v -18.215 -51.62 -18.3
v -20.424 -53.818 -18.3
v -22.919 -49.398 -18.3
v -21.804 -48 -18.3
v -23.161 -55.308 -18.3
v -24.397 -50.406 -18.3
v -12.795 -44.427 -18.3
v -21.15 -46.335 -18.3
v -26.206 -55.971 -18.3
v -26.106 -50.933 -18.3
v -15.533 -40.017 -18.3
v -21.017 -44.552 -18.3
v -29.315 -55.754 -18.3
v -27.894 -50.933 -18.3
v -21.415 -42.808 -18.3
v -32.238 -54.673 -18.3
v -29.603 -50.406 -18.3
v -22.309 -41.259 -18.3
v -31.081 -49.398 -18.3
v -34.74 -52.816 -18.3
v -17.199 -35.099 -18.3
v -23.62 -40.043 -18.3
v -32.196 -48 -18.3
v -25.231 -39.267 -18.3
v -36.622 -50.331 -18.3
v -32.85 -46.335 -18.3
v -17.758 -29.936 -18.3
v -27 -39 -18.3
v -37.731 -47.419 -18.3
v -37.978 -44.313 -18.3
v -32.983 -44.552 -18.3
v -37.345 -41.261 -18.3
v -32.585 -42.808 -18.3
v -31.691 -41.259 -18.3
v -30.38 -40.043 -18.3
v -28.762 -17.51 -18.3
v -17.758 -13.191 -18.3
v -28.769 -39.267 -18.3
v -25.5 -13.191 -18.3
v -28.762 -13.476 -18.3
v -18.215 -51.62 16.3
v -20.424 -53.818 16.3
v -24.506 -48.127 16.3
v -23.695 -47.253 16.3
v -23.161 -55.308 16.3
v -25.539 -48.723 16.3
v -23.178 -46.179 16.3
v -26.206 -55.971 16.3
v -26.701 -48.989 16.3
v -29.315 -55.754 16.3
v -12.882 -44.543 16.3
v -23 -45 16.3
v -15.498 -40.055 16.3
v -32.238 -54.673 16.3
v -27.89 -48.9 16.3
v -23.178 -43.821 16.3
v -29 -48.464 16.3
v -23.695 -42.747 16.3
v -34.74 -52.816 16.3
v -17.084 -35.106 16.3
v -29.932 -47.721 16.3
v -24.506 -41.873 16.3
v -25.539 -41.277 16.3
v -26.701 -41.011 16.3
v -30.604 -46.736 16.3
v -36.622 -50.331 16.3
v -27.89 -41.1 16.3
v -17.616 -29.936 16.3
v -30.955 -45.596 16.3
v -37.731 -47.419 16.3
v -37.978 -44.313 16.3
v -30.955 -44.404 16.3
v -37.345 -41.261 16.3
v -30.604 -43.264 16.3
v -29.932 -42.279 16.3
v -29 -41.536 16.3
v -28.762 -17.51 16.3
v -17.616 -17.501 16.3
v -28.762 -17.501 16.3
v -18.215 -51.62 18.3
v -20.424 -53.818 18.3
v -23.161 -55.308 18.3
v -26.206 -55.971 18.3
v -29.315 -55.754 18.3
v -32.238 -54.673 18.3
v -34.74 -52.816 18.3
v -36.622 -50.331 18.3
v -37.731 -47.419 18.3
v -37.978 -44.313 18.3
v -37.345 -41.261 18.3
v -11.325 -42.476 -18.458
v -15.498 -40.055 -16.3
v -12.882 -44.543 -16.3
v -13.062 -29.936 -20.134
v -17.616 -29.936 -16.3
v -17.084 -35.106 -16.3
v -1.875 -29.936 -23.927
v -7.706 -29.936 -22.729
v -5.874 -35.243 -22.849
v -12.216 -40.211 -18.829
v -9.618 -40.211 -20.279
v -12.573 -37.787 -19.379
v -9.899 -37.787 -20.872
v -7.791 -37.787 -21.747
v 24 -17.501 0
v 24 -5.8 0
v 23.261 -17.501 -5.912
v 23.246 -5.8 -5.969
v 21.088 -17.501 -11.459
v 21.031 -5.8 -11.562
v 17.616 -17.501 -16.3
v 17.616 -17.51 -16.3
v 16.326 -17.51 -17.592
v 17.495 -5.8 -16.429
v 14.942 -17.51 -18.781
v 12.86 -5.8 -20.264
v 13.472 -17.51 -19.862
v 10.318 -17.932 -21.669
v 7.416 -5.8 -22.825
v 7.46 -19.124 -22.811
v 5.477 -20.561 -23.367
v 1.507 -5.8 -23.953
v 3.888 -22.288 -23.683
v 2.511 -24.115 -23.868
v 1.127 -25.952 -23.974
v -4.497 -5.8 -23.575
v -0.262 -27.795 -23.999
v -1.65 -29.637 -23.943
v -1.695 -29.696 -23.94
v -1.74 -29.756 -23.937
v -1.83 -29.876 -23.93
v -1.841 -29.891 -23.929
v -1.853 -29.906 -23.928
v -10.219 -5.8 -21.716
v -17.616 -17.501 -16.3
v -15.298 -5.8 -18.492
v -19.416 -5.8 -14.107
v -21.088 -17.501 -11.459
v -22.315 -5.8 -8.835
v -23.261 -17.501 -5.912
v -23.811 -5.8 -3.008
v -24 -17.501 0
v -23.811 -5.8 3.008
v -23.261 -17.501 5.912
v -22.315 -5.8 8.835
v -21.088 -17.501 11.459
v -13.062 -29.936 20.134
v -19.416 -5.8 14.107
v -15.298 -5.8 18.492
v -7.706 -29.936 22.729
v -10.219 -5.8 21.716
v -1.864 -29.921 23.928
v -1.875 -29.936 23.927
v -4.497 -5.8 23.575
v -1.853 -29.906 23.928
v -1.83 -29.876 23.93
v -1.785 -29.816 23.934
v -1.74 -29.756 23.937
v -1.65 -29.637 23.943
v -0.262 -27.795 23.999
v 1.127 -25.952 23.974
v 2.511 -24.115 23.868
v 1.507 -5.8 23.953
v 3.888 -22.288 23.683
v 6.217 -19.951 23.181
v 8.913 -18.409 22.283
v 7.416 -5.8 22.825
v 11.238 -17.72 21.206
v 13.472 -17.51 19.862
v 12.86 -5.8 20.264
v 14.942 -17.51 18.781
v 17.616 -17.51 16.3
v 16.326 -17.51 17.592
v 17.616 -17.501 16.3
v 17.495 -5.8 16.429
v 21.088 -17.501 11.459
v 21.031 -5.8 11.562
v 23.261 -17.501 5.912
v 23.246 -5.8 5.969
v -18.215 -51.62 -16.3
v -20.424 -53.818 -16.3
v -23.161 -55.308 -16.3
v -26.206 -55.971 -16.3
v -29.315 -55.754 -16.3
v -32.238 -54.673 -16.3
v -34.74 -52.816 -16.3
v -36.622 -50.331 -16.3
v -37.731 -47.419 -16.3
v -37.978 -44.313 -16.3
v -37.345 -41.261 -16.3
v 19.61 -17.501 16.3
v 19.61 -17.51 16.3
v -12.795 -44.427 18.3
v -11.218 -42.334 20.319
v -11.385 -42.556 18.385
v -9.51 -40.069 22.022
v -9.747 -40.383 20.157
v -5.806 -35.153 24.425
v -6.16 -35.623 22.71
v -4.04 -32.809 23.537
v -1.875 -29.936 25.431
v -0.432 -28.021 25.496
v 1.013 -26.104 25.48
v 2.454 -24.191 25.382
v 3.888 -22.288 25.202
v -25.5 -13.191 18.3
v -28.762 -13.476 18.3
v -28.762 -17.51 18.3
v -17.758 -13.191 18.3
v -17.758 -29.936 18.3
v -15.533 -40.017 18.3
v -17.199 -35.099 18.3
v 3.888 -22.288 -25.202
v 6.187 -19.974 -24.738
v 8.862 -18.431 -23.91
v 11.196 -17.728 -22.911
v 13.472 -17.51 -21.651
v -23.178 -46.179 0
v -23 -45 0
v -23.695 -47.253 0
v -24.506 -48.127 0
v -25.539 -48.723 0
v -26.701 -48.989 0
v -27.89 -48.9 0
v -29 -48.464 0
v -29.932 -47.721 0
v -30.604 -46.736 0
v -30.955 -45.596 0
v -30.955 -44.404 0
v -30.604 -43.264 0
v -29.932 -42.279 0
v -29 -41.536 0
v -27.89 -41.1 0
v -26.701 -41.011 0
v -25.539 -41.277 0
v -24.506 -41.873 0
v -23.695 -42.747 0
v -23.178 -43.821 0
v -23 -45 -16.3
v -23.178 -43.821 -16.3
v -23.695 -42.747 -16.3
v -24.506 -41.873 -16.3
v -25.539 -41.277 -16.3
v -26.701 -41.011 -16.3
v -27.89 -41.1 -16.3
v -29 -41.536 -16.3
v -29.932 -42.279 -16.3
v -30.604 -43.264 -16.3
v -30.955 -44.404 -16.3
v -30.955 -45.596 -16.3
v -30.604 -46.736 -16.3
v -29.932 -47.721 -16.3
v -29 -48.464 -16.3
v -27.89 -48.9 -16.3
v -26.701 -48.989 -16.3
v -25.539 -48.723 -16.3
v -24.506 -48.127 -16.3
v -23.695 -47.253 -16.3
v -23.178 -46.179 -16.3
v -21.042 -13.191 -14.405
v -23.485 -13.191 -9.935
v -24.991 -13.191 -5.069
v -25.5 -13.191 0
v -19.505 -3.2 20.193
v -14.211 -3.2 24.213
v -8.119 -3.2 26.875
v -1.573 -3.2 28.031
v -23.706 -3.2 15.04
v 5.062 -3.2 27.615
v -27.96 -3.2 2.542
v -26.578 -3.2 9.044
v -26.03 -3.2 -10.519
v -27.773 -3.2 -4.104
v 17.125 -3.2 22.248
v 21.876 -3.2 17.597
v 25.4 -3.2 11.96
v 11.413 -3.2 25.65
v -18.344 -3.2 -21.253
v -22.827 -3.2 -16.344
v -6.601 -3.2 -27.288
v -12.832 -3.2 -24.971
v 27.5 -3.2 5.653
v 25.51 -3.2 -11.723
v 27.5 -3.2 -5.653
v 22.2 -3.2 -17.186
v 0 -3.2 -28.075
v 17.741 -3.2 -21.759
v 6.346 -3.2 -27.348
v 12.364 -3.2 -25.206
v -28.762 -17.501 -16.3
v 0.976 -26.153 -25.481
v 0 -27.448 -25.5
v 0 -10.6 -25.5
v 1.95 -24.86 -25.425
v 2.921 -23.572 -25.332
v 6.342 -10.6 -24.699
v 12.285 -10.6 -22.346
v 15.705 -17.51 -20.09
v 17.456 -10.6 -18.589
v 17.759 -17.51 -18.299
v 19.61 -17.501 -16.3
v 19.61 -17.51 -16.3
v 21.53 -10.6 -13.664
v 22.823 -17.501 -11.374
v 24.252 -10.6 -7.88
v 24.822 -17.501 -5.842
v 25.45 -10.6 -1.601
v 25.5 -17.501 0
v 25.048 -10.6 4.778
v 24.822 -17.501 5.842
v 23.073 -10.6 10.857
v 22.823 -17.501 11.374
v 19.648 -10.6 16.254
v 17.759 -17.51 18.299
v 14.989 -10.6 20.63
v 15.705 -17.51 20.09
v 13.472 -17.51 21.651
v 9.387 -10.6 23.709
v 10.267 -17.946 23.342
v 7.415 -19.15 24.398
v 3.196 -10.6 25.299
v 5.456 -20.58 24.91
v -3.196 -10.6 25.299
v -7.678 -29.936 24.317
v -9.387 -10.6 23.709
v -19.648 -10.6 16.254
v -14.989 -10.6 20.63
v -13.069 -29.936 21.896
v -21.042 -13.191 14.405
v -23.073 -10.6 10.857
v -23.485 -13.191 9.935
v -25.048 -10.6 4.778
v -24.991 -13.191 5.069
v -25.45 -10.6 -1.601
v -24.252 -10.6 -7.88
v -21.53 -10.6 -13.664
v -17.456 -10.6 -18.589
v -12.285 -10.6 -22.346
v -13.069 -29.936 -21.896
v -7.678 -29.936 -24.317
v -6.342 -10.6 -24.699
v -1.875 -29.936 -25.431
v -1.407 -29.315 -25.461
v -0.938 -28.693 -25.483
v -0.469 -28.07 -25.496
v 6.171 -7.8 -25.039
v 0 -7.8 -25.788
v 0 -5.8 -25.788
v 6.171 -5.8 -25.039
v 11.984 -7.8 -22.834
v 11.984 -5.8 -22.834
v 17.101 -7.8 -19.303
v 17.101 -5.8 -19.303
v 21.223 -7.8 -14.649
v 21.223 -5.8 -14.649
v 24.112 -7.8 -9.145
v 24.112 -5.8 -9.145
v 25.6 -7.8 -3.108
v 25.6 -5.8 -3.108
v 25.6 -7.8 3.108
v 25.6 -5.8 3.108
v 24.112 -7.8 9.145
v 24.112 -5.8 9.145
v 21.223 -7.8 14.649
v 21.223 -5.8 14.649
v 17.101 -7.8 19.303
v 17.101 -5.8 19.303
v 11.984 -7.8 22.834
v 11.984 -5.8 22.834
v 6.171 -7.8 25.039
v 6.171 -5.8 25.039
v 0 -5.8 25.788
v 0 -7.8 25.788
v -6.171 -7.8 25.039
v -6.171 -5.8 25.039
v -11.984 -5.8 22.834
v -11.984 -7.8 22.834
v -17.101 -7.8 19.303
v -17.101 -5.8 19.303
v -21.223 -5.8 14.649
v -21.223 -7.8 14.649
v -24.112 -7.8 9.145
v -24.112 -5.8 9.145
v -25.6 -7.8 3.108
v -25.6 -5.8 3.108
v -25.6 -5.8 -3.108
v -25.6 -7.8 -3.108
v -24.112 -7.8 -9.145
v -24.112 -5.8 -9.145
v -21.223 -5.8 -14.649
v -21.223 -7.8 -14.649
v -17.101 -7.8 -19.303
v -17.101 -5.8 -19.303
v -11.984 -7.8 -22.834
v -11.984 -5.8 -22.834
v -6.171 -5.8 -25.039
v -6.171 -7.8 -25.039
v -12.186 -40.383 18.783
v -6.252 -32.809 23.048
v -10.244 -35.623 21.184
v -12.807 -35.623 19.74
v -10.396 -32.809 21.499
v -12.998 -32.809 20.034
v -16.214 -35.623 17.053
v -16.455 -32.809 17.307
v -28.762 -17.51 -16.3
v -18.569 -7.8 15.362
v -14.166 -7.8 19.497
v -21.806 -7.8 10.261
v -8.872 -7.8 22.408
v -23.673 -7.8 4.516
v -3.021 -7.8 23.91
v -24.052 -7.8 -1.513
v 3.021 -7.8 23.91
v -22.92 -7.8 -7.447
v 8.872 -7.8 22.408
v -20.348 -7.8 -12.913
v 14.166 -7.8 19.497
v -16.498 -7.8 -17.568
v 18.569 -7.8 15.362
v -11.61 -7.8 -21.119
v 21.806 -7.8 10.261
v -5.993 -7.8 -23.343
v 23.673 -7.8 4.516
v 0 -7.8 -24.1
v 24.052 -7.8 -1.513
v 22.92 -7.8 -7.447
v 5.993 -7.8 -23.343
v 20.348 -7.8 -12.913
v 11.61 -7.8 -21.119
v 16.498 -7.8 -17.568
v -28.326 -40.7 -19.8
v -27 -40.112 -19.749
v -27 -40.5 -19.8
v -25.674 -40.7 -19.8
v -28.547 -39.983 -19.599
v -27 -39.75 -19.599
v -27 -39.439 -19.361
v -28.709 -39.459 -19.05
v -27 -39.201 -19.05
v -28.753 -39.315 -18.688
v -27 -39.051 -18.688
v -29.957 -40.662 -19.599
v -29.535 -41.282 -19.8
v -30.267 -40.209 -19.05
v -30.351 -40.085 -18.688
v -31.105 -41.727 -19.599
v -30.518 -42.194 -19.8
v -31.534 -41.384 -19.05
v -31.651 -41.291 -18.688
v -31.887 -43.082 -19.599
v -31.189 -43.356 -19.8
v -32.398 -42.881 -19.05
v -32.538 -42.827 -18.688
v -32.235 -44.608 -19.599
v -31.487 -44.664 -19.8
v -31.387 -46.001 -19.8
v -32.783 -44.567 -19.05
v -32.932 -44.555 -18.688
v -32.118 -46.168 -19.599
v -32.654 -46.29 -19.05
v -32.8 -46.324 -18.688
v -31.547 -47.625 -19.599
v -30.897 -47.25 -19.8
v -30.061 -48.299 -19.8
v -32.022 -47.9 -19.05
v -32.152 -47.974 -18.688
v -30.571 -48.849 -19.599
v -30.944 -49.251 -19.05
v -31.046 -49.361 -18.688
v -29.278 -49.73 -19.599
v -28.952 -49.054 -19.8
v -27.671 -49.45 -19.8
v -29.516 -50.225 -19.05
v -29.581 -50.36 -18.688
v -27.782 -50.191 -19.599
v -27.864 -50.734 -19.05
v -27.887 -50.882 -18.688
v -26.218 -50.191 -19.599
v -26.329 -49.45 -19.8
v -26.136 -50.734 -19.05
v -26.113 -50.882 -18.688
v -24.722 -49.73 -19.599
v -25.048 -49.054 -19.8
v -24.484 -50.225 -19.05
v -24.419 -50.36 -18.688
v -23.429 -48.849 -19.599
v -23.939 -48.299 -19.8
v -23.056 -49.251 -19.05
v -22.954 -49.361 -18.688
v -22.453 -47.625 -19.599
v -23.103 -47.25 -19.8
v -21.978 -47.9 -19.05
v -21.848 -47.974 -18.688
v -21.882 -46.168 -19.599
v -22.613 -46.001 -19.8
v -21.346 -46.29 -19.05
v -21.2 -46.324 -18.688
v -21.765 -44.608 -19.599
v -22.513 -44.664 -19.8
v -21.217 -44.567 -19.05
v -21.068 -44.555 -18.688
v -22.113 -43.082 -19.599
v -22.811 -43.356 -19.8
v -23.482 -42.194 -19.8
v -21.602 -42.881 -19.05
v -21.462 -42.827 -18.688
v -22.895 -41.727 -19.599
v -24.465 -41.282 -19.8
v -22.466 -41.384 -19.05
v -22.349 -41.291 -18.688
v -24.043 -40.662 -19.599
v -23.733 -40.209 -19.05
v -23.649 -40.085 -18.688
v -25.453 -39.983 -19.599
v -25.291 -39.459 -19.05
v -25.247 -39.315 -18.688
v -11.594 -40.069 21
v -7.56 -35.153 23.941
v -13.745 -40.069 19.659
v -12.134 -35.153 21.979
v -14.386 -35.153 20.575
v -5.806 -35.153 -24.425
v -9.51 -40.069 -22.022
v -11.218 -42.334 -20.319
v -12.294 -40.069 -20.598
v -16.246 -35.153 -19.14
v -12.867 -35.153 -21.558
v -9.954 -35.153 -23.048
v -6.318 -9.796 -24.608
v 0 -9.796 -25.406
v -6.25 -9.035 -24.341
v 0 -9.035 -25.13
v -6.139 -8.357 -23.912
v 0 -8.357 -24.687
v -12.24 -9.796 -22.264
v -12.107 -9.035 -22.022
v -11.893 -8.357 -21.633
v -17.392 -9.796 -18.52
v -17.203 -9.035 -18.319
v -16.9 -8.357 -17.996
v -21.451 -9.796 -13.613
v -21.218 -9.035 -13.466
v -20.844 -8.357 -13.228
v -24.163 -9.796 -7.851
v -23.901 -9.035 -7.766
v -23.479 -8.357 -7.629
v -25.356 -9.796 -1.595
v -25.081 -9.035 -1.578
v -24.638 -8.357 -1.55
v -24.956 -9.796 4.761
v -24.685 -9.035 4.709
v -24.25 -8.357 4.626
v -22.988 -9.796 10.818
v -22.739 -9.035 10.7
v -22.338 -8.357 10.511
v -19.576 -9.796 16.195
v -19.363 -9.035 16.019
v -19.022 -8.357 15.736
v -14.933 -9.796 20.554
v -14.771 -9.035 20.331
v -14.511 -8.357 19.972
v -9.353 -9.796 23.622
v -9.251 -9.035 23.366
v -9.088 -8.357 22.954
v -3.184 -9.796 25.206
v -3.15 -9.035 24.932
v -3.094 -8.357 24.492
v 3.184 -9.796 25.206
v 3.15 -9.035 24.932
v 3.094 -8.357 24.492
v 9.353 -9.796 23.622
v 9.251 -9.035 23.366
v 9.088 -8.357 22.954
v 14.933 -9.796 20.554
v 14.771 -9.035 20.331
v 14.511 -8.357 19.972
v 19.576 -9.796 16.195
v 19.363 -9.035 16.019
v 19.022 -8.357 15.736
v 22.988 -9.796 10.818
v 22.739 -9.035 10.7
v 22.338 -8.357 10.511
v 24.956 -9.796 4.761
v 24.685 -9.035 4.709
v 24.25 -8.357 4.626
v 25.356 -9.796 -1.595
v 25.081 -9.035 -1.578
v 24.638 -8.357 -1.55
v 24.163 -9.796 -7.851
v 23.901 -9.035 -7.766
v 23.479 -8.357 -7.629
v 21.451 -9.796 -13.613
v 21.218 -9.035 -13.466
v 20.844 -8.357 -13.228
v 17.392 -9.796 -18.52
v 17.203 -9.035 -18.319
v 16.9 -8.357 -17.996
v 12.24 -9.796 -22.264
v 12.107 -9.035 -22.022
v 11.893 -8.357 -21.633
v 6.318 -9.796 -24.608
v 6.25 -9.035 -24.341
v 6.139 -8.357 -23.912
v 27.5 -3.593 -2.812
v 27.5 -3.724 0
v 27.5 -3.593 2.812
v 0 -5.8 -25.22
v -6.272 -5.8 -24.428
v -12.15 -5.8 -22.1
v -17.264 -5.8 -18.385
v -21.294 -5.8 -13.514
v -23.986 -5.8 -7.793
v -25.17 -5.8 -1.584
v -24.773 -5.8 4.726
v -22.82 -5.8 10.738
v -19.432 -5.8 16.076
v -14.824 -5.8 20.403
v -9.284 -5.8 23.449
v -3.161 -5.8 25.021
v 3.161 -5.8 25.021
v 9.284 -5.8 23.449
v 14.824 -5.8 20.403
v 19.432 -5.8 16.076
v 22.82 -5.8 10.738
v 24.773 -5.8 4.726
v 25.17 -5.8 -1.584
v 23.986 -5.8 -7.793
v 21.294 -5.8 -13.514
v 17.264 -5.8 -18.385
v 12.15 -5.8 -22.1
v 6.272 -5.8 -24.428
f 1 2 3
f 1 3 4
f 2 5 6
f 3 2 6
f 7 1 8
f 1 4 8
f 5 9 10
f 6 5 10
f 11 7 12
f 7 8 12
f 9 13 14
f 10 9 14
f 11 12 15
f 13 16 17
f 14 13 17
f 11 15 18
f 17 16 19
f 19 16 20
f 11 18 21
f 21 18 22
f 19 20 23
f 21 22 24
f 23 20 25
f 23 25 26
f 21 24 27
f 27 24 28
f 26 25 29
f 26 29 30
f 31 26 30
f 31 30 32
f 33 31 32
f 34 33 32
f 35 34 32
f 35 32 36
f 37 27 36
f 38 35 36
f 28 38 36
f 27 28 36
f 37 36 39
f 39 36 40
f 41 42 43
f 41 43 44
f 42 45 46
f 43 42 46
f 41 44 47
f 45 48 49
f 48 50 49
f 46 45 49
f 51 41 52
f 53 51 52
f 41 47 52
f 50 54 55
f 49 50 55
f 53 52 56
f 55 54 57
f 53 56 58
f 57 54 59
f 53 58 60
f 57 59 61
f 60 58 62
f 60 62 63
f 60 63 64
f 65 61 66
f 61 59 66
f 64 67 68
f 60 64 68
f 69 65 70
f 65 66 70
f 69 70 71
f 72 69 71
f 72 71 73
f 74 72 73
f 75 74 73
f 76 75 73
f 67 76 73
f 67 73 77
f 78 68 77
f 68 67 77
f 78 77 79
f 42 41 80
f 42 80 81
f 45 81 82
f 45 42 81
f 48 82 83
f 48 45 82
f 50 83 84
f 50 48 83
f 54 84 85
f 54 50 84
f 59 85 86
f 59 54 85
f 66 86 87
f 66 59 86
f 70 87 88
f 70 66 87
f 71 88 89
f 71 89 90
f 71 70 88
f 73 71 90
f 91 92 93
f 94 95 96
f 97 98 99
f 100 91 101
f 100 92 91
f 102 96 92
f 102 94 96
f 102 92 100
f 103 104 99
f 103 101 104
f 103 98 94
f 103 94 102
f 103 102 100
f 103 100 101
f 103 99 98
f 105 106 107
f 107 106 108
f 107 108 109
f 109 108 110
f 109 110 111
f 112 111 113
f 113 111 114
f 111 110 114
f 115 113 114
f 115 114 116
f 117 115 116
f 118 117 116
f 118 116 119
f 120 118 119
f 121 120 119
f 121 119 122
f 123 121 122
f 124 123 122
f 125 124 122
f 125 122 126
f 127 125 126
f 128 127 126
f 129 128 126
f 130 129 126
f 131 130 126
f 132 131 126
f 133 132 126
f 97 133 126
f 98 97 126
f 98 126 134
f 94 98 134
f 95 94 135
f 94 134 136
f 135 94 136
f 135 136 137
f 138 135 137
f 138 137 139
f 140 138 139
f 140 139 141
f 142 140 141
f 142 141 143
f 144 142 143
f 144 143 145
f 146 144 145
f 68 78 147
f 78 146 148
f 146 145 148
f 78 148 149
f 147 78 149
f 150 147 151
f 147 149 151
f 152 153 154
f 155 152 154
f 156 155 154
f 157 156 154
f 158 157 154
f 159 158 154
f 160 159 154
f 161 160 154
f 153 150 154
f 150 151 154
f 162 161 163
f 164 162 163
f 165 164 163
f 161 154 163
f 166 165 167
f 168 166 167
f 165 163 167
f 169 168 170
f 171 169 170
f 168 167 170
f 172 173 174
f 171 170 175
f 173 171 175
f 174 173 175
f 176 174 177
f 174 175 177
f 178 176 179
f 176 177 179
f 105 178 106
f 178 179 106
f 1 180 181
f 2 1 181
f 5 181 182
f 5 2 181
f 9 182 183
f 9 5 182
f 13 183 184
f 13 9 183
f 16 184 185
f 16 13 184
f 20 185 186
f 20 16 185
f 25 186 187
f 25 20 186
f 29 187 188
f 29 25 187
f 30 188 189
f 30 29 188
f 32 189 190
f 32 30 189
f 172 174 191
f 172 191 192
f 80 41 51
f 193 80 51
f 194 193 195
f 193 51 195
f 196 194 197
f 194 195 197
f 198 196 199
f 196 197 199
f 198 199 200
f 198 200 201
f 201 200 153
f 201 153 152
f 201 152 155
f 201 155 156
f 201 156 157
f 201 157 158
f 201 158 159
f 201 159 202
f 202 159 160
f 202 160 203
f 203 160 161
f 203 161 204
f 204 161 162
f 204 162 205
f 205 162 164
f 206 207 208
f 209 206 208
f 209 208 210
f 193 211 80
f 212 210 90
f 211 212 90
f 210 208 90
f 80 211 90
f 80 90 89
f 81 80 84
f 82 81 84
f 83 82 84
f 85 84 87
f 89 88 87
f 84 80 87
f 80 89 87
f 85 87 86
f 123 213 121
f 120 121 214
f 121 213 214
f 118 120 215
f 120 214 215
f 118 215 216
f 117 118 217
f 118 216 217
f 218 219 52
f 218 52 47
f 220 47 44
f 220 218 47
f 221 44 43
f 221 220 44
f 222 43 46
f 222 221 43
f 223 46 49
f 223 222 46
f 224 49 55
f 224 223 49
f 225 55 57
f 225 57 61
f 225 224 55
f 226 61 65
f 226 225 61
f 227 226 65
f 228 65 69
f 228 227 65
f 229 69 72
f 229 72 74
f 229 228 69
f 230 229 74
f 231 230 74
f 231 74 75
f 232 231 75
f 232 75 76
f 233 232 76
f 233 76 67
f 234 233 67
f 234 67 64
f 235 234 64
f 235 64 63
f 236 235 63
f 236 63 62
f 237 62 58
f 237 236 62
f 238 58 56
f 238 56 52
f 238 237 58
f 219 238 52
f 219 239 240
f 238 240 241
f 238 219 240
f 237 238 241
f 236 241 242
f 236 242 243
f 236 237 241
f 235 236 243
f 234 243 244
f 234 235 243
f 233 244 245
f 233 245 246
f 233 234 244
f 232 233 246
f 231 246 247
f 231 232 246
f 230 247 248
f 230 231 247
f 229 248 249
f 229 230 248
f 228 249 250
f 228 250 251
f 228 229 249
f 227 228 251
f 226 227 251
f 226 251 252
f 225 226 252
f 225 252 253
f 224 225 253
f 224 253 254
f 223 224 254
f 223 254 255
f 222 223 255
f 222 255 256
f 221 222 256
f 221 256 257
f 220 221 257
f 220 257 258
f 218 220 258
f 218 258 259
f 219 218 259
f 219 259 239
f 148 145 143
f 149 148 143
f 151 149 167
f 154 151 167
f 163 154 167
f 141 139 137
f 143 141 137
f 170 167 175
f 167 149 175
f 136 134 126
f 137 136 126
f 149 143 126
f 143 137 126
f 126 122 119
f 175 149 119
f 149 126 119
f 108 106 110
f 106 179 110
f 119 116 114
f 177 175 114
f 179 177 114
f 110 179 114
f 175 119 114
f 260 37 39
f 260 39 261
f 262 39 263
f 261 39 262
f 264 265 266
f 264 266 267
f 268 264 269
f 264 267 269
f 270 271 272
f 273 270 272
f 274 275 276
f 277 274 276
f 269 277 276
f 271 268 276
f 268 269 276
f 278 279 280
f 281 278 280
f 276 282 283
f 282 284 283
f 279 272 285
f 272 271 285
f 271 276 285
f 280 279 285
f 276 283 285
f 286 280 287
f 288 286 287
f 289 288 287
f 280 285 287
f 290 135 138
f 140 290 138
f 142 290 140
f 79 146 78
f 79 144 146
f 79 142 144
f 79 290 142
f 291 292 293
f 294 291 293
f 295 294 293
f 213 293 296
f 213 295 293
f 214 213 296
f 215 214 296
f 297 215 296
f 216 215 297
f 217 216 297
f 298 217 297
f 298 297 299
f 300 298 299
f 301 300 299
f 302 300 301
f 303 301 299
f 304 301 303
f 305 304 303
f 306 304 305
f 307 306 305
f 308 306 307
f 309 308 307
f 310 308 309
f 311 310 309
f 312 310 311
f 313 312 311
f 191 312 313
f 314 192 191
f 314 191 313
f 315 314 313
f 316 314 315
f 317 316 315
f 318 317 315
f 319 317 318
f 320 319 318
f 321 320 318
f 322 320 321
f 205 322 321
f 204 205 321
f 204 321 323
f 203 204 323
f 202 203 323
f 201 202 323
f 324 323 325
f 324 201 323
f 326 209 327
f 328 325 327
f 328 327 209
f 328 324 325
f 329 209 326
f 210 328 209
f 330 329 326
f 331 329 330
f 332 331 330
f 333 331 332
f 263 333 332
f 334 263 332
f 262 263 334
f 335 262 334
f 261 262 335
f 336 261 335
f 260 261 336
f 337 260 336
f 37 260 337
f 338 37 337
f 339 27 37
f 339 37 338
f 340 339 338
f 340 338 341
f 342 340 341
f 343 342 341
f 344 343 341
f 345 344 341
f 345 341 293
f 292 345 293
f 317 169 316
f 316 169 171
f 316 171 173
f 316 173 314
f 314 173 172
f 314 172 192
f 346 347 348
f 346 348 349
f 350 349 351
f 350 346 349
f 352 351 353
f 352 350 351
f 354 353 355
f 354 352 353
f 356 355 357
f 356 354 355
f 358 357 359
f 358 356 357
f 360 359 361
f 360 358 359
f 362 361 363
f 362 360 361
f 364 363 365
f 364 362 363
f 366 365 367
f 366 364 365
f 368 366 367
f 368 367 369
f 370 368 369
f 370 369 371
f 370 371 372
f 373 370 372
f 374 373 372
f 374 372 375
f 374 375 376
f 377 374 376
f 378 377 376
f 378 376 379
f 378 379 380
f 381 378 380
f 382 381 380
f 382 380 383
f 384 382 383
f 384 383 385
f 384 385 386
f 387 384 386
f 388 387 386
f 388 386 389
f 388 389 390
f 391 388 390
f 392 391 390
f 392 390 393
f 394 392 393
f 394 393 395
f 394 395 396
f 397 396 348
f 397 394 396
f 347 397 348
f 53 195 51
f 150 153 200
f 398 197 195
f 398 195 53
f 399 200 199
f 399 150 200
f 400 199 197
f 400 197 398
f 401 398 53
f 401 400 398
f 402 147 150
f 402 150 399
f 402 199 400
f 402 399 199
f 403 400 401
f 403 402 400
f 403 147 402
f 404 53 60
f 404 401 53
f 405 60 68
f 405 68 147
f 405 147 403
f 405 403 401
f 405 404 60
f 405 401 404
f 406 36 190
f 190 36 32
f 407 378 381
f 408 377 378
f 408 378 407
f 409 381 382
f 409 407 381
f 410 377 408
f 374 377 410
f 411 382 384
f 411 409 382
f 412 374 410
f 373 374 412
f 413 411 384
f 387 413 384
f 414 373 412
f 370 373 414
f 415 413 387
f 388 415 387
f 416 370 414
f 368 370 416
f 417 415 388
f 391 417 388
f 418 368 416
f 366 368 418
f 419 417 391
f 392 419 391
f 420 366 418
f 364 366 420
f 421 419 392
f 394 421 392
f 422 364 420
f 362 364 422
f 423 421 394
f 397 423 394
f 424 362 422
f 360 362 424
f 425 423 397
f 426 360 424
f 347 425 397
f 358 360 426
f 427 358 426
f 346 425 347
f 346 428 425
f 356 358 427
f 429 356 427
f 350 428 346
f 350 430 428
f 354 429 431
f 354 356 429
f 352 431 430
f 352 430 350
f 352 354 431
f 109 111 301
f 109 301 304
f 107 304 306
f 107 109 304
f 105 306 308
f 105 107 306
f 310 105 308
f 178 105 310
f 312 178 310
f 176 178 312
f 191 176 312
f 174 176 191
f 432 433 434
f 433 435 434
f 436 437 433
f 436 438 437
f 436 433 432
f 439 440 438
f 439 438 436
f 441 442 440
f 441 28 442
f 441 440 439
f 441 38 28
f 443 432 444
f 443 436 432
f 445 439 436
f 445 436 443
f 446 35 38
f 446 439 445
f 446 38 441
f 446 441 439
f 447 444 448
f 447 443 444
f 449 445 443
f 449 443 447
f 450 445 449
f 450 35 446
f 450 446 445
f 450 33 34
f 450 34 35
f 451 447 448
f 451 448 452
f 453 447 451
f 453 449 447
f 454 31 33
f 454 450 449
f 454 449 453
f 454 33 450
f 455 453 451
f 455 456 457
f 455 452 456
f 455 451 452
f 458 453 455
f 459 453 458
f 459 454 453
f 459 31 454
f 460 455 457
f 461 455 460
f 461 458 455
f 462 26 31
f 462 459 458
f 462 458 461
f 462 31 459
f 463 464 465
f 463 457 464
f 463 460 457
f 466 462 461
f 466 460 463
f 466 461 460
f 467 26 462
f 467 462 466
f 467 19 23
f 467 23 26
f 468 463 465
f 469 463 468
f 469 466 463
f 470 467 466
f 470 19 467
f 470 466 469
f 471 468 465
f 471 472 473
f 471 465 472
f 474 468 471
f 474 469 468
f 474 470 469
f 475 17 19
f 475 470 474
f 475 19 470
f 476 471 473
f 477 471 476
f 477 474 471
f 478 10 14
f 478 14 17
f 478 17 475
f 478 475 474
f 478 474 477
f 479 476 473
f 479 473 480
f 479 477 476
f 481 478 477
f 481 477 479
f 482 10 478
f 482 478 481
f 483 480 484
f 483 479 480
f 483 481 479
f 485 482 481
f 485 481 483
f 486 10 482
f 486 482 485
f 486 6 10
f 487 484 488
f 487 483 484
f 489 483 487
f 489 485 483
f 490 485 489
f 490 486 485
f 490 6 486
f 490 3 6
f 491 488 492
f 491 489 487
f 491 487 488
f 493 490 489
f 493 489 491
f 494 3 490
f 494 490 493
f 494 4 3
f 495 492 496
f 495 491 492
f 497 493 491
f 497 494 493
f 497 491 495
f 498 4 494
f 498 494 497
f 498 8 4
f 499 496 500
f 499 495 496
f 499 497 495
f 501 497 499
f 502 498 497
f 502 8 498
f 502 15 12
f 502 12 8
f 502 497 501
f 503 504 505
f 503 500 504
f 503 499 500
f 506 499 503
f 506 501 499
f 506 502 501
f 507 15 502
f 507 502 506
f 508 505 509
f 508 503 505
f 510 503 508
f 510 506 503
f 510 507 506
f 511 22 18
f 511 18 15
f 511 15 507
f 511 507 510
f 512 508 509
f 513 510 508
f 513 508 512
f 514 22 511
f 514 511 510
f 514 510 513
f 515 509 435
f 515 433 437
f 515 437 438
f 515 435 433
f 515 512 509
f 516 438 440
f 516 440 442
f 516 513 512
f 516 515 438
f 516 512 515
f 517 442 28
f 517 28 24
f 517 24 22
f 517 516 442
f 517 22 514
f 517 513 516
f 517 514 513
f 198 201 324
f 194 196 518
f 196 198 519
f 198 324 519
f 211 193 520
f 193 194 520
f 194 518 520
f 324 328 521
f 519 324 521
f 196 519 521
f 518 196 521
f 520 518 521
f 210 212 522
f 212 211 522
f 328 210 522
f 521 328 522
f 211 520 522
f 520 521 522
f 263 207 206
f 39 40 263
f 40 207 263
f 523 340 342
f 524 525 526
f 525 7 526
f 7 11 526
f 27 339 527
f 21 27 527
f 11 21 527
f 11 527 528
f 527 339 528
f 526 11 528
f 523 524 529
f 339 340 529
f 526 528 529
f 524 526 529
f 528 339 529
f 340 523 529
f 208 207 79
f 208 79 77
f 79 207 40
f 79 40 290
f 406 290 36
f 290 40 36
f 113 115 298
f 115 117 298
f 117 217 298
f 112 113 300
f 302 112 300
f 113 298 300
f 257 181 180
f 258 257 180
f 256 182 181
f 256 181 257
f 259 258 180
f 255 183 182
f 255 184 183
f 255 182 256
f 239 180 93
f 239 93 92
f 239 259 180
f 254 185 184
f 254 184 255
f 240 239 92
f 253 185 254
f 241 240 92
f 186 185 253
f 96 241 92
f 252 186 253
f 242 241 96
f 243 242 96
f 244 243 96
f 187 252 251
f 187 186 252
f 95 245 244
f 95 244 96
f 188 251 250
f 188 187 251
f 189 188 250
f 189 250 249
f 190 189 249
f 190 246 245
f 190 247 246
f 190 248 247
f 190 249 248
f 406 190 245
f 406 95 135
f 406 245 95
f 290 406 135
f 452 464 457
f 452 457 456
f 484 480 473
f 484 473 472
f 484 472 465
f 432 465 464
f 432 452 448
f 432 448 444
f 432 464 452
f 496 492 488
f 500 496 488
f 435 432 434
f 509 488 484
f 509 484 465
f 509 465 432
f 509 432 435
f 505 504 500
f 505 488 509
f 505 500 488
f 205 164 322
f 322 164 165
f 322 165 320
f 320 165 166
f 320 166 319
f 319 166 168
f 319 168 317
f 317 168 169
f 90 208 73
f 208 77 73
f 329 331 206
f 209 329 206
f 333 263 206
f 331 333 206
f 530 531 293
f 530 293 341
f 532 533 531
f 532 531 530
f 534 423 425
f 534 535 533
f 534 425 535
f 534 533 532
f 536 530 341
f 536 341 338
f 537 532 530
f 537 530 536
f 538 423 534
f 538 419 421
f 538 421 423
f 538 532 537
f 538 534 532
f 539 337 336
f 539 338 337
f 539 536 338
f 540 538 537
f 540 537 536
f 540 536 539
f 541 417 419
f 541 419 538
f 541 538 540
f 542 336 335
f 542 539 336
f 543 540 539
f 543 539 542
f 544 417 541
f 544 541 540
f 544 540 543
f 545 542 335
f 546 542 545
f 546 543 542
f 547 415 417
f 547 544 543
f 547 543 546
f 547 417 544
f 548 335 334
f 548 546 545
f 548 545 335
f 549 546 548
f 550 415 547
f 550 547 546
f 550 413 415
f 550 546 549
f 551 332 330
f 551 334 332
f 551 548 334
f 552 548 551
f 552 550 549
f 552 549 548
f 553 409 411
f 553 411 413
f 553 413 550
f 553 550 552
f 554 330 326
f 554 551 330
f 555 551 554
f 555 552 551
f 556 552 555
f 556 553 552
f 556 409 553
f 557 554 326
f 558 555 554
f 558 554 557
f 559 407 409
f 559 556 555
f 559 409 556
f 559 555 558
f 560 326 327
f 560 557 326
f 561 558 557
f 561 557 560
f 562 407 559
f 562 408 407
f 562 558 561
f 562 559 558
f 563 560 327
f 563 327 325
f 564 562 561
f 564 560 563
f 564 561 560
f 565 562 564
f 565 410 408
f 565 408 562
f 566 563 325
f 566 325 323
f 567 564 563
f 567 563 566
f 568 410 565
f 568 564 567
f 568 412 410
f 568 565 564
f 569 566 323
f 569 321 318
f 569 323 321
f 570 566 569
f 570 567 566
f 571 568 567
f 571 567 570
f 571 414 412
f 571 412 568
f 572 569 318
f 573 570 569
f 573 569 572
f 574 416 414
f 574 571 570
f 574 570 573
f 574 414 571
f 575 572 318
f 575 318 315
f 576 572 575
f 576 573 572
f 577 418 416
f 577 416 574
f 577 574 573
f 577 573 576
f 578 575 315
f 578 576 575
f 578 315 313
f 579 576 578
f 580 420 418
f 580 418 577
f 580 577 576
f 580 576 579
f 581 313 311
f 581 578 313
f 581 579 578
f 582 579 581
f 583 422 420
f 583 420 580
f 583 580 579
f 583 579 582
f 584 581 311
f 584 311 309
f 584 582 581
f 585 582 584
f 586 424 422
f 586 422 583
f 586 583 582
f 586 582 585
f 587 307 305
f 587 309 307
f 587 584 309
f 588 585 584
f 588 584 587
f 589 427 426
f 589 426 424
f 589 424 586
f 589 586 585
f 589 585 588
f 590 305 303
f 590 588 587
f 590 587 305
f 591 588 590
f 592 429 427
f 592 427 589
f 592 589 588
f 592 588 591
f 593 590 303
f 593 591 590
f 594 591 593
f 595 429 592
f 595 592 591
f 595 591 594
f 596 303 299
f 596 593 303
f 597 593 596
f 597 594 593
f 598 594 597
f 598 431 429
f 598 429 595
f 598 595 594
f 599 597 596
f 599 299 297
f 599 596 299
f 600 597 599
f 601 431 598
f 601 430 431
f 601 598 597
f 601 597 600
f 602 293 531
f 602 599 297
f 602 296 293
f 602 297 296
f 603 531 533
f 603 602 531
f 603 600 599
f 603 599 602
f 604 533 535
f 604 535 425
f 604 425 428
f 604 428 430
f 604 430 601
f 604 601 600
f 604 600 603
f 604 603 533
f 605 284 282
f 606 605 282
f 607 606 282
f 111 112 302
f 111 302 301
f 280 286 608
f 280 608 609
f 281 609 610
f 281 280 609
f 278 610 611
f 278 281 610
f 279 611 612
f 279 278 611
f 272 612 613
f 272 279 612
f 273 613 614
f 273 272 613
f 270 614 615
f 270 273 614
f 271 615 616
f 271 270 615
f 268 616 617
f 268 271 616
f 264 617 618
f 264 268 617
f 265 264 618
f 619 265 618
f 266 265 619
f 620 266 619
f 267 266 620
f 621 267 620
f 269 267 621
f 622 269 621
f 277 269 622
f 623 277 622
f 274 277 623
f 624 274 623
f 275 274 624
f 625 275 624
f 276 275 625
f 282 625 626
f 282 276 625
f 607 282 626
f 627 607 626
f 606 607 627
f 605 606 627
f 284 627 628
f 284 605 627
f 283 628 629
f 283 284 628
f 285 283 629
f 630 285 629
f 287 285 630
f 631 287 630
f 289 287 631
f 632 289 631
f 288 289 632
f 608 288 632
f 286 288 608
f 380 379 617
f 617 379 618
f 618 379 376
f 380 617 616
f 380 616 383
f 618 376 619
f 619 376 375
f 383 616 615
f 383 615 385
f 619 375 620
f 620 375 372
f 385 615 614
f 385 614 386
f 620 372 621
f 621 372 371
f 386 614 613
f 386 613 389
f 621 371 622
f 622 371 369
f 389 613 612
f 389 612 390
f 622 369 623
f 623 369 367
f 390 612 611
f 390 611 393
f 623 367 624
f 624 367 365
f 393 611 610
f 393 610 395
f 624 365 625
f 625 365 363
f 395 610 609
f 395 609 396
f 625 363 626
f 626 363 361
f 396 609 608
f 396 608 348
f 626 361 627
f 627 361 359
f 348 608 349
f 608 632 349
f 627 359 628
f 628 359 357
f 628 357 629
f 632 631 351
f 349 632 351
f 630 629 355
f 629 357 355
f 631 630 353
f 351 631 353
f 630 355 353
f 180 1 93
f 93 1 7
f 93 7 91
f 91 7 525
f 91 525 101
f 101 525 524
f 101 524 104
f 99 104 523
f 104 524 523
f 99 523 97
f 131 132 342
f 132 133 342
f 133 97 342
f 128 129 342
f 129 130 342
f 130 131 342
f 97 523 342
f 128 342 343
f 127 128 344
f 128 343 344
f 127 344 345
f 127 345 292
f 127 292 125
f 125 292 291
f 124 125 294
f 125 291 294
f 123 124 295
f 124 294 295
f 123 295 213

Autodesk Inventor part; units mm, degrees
sketch "Sketch_1" plane through (0, 0, 0) normal (1, 0, 0) x (0, 1, 0)
  line L0 (-56, 0) -> (0, 0)
  line L1 (-3.2, 0) -> (-3.2, -28.075)
  line L2 (-3.2, -28.075) -> (-5.8, -25.22)
  line L3 (-5.8, -25.22) -> (-5.8, -25.7879)
  line L4 (-5.8, -25.7879) -> (-7.8, -25.7879)
  line L5 (-7.8, -25.7879) -> (-7.8, -24.1)
  arc A0 (-10.6, -25.5) -> (-7.8, -24.1) centre (-10.6, -22) ccw
  line L6 (-10.6, -25.5) -> (-29.936, -25.5)
  arc A1 (-51.0993, -18.3) -> (-29.936, -25.5) centre (-29.936, 9.203) ccw
  line L7 (-51.0993, -18.3) -> (-56, -18.3)
  line L8 (-56, -18.3) -> (-56, 0)
  line L9 (-56, 0) -> (-3.2, 0)
revolve "Revolution1" add sketch "Sketch_1" angle 360 about axis through (0, -56, 0) along (0, -1, 0)
sketch "Sketch_2" plane through (0, 0, 0) normal (0, 0, 1) x (1, 0, 0)
  line L0 (-50, -13.191) -> (-21.7584, -56)
  line L1 (-21.7584, -56) -> (-17.7584, -56)
  line L2 (-17.7584, -56) -> (-17.7584, -13.191)
  line L3 (-17.7584, -13.191) -> (-50, -13.191)
extrude "Extrusion1" cut sketch "Sketch_2" along normal mid plane 56
sketch "Sketch_3" plane through (0, 0, 0) normal (0, 0, 1) x (1, 0, 0)
  line L0 (-150, -150) -> (150, -150)
  line L1 (150, -150) -> (150, 150)
  line L2 (150, 150) -> (-150, 150)
  line L3 (-150, 150) -> (-150, -150)
  arc A0 (-37.3451, -41.2613) -> (-18.215, -51.6199) centre (-27, -45) ccw
  line L4 (-18.215, -51.6199) -> (3.8878, -22.2883)
  arc A1 (13.4715, -17.51) -> (3.8878, -22.2883) centre (13.4715, -29.51) ccw
  line L5 (13.4715, -17.51) -> (27.5, -17.51)
  line L6 (27.5, -17.51) -> (27.5, 0)
  line L7 (27.5, 0) -> (-28.7615, 0)
  line L8 (-28.7615, 0) -> (-28.7615, -17.51)
  line L9 (-28.7615, -17.51) -> (-37.3451, -41.2613)
sketch "Sketch_5" plane through (-17.7584, 0, 0) normal (1, 0, 0) x (0, 0, -1)
  line L0 (-18.3, -56) -> (-16.3, -56)
  line L1 (-16.3, -56) -> (-16.3, -17.501)
  line L2 (-16.3, -17.501) -> (16.3, -17.501)
  line L3 (16.3, -17.501) -> (16.3, -56)
  line L4 (16.3, -56) -> (18.3, -56)
  line L5 (18.3, -56) -> (18.3, -13.191)
  line L6 (18.3, -13.191) -> (-18.3, -13.191)
  line L7 (-18.3, -13.191) -> (-18.3, -56)
extrude "Extrusion2" add sketch "Sketch_5" along normal mid plane 44
extrude "Extrusion3" cut sketch "Sketch_3" along normal mid plane 100
sketch "Sketch_4" plane through (0, -5.8, 0) normal (0, 1, 0) x (1, 0, 0)
  circle A0 centre (0, 0) radius 24
extrude "Extrusion4" cut sketch "Sketch_4" against normal blind 24.076
sketch "Sketch_6" plane through (0, 0, 0) normal (1, 0, 0) x (0, 1, 0)
  line L0 (-56, 0) -> (0, 0)
  line L1 (-29.6366, 0) -> (-29.6366, -24)
  line L2 (-29.6366, -24) -> (-29.936, -24)
  arc A0 (-51.0993, -16.8) -> (-29.936, -24) centre (-29.936, 10.703) ccw
  line L3 (-51.0993, -16.8) -> (-51.0993, 0)
  line L4 (-51.0993, 0) -> (-29.6366, 0)
revolve "Revolution2" cut sketch "Sketch_6" angle 360 about axis through (0, -56, 0) along (0, -1, 0)
sketch "Sketch_7" plane through (0, 0, 0) normal (1, 0, 0) x (0, 1, 0)
  line L0 (-56, 16.3) -> (-56, -16.3)
  line L1 (-56, -16.3) -> (-17.501, -16.3)
  line L2 (-17.501, -16.3) -> (-17.501, 16.3)
  line L3 (-17.501, 16.3) -> (-56, 16.3)
extrude "Extrusion5" cut sketch "Sketch_7" along normal mid plane 116
sketch "Sketch_8" plane through (0, 0, 0) normal (0, 0, 1) x (1, 0, 0)
  line L0 (-50, -15.3345) -> (-25.5, -13.191)
  line L1 (-25.5, -13.191) -> (-50, -13.191)
  line L2 (-50, -13.191) -> (-50, -15.3345)
extrude "Extrusion6" cut sketch "Sketch_8" along normal mid plane 116
sketch "Sketch_9" plane through (0, 0, 0) normal (0, 0, 1) x (1, 0, 0)
  circle A0 centre (-27, -45) radius 4
extrude "Extrusion7" add sketch "Sketch_9" along normal mid plane 36.6
sketch "Sketch_10" plane through (-27, 0, 0) normal (1, 0, 0) x (0, 0, -1)
  line L0 (19.8, -45) -> (18.3, -45)
  line L1 (18.3, -45) -> (18.3, -39)
  arc A0 (19.8, -40.5) -> (18.3, -39) centre (18.3, -40.5) ccw
  line L2 (19.8, -40.5) -> (19.8, -45)
  line L3 (19.8, -45) -> (18.3, -45)
revolve "Revolution3" add sketch "Sketch_10" angle 360 about axis through (-27, -45, -19.8) along (0, 0, -1)
ref_plane "body_to_dummy_XY" through (0, 0, 0) normal (0, -1, 0) x (1, 0, 0)
ref_plane "body_to_dummy_YZ" through (0, 0, 0) normal (1, 0, 0) x (0, 0, 1)
ref_plane "body_to_dummy_ZX" through (0, 0, 0) normal (0, 0, 1) x (0, -1, 0)
ref_plane "body_to_stopper_left_XY" through (-27, -45, -18.3) normal (0, 0, -1) x (1, 0, 0)
ref_plane "body_to_stopper_left_YZ" through (-27, -45, -18.3) normal (1, 0, 0) x (0, -1, 0)
ref_plane "body_to_stopper_left_ZX" through (-27, -45, -18.3) normal (0, -1, 0) x (0, 0, -1)
ref_plane "body_to_stopper_right_XY" through (-27, -45, 18.3) normal (0, 0, 1) x (1, 0, 0)
ref_plane "body_to_stopper_right_YZ" through (-27, -45, 18.3) normal (1, 0, 0) x (0, 1, 0)
ref_plane "body_to_stopper_right_ZX" through (-27, -45, 18.3) normal (0, 1, 0) x (0, 0, 1)
ref_plane "body_to_swivel_XY" through (0, -3.2, 0) normal (0, -1, 0) x (1, 0, 0)
ref_plane "body_to_swivel_YZ" through (0, -3.2, 0) normal (1, 0, 0) x (0, 0, 1)
ref_plane "body_to_swivel_ZX" through (0, -3.2, 0) normal (0, 0, 1) x (0, -1, 0)
ref_plane "body_to_wheel_XY" through (-27, -45, 0) normal (0, 0, 1) x (1, 0, 0)
ref_plane "body_to_wheel_YZ" through (-27, -45, 0) normal (1, 0, 0) x (0, 1, 0)
ref_plane "body_to_wheel_ZX" through (-27, -45, 0) normal (0, 1, 0) x (0, 0, 1)
properties part number "BODY-HSMCS50"
